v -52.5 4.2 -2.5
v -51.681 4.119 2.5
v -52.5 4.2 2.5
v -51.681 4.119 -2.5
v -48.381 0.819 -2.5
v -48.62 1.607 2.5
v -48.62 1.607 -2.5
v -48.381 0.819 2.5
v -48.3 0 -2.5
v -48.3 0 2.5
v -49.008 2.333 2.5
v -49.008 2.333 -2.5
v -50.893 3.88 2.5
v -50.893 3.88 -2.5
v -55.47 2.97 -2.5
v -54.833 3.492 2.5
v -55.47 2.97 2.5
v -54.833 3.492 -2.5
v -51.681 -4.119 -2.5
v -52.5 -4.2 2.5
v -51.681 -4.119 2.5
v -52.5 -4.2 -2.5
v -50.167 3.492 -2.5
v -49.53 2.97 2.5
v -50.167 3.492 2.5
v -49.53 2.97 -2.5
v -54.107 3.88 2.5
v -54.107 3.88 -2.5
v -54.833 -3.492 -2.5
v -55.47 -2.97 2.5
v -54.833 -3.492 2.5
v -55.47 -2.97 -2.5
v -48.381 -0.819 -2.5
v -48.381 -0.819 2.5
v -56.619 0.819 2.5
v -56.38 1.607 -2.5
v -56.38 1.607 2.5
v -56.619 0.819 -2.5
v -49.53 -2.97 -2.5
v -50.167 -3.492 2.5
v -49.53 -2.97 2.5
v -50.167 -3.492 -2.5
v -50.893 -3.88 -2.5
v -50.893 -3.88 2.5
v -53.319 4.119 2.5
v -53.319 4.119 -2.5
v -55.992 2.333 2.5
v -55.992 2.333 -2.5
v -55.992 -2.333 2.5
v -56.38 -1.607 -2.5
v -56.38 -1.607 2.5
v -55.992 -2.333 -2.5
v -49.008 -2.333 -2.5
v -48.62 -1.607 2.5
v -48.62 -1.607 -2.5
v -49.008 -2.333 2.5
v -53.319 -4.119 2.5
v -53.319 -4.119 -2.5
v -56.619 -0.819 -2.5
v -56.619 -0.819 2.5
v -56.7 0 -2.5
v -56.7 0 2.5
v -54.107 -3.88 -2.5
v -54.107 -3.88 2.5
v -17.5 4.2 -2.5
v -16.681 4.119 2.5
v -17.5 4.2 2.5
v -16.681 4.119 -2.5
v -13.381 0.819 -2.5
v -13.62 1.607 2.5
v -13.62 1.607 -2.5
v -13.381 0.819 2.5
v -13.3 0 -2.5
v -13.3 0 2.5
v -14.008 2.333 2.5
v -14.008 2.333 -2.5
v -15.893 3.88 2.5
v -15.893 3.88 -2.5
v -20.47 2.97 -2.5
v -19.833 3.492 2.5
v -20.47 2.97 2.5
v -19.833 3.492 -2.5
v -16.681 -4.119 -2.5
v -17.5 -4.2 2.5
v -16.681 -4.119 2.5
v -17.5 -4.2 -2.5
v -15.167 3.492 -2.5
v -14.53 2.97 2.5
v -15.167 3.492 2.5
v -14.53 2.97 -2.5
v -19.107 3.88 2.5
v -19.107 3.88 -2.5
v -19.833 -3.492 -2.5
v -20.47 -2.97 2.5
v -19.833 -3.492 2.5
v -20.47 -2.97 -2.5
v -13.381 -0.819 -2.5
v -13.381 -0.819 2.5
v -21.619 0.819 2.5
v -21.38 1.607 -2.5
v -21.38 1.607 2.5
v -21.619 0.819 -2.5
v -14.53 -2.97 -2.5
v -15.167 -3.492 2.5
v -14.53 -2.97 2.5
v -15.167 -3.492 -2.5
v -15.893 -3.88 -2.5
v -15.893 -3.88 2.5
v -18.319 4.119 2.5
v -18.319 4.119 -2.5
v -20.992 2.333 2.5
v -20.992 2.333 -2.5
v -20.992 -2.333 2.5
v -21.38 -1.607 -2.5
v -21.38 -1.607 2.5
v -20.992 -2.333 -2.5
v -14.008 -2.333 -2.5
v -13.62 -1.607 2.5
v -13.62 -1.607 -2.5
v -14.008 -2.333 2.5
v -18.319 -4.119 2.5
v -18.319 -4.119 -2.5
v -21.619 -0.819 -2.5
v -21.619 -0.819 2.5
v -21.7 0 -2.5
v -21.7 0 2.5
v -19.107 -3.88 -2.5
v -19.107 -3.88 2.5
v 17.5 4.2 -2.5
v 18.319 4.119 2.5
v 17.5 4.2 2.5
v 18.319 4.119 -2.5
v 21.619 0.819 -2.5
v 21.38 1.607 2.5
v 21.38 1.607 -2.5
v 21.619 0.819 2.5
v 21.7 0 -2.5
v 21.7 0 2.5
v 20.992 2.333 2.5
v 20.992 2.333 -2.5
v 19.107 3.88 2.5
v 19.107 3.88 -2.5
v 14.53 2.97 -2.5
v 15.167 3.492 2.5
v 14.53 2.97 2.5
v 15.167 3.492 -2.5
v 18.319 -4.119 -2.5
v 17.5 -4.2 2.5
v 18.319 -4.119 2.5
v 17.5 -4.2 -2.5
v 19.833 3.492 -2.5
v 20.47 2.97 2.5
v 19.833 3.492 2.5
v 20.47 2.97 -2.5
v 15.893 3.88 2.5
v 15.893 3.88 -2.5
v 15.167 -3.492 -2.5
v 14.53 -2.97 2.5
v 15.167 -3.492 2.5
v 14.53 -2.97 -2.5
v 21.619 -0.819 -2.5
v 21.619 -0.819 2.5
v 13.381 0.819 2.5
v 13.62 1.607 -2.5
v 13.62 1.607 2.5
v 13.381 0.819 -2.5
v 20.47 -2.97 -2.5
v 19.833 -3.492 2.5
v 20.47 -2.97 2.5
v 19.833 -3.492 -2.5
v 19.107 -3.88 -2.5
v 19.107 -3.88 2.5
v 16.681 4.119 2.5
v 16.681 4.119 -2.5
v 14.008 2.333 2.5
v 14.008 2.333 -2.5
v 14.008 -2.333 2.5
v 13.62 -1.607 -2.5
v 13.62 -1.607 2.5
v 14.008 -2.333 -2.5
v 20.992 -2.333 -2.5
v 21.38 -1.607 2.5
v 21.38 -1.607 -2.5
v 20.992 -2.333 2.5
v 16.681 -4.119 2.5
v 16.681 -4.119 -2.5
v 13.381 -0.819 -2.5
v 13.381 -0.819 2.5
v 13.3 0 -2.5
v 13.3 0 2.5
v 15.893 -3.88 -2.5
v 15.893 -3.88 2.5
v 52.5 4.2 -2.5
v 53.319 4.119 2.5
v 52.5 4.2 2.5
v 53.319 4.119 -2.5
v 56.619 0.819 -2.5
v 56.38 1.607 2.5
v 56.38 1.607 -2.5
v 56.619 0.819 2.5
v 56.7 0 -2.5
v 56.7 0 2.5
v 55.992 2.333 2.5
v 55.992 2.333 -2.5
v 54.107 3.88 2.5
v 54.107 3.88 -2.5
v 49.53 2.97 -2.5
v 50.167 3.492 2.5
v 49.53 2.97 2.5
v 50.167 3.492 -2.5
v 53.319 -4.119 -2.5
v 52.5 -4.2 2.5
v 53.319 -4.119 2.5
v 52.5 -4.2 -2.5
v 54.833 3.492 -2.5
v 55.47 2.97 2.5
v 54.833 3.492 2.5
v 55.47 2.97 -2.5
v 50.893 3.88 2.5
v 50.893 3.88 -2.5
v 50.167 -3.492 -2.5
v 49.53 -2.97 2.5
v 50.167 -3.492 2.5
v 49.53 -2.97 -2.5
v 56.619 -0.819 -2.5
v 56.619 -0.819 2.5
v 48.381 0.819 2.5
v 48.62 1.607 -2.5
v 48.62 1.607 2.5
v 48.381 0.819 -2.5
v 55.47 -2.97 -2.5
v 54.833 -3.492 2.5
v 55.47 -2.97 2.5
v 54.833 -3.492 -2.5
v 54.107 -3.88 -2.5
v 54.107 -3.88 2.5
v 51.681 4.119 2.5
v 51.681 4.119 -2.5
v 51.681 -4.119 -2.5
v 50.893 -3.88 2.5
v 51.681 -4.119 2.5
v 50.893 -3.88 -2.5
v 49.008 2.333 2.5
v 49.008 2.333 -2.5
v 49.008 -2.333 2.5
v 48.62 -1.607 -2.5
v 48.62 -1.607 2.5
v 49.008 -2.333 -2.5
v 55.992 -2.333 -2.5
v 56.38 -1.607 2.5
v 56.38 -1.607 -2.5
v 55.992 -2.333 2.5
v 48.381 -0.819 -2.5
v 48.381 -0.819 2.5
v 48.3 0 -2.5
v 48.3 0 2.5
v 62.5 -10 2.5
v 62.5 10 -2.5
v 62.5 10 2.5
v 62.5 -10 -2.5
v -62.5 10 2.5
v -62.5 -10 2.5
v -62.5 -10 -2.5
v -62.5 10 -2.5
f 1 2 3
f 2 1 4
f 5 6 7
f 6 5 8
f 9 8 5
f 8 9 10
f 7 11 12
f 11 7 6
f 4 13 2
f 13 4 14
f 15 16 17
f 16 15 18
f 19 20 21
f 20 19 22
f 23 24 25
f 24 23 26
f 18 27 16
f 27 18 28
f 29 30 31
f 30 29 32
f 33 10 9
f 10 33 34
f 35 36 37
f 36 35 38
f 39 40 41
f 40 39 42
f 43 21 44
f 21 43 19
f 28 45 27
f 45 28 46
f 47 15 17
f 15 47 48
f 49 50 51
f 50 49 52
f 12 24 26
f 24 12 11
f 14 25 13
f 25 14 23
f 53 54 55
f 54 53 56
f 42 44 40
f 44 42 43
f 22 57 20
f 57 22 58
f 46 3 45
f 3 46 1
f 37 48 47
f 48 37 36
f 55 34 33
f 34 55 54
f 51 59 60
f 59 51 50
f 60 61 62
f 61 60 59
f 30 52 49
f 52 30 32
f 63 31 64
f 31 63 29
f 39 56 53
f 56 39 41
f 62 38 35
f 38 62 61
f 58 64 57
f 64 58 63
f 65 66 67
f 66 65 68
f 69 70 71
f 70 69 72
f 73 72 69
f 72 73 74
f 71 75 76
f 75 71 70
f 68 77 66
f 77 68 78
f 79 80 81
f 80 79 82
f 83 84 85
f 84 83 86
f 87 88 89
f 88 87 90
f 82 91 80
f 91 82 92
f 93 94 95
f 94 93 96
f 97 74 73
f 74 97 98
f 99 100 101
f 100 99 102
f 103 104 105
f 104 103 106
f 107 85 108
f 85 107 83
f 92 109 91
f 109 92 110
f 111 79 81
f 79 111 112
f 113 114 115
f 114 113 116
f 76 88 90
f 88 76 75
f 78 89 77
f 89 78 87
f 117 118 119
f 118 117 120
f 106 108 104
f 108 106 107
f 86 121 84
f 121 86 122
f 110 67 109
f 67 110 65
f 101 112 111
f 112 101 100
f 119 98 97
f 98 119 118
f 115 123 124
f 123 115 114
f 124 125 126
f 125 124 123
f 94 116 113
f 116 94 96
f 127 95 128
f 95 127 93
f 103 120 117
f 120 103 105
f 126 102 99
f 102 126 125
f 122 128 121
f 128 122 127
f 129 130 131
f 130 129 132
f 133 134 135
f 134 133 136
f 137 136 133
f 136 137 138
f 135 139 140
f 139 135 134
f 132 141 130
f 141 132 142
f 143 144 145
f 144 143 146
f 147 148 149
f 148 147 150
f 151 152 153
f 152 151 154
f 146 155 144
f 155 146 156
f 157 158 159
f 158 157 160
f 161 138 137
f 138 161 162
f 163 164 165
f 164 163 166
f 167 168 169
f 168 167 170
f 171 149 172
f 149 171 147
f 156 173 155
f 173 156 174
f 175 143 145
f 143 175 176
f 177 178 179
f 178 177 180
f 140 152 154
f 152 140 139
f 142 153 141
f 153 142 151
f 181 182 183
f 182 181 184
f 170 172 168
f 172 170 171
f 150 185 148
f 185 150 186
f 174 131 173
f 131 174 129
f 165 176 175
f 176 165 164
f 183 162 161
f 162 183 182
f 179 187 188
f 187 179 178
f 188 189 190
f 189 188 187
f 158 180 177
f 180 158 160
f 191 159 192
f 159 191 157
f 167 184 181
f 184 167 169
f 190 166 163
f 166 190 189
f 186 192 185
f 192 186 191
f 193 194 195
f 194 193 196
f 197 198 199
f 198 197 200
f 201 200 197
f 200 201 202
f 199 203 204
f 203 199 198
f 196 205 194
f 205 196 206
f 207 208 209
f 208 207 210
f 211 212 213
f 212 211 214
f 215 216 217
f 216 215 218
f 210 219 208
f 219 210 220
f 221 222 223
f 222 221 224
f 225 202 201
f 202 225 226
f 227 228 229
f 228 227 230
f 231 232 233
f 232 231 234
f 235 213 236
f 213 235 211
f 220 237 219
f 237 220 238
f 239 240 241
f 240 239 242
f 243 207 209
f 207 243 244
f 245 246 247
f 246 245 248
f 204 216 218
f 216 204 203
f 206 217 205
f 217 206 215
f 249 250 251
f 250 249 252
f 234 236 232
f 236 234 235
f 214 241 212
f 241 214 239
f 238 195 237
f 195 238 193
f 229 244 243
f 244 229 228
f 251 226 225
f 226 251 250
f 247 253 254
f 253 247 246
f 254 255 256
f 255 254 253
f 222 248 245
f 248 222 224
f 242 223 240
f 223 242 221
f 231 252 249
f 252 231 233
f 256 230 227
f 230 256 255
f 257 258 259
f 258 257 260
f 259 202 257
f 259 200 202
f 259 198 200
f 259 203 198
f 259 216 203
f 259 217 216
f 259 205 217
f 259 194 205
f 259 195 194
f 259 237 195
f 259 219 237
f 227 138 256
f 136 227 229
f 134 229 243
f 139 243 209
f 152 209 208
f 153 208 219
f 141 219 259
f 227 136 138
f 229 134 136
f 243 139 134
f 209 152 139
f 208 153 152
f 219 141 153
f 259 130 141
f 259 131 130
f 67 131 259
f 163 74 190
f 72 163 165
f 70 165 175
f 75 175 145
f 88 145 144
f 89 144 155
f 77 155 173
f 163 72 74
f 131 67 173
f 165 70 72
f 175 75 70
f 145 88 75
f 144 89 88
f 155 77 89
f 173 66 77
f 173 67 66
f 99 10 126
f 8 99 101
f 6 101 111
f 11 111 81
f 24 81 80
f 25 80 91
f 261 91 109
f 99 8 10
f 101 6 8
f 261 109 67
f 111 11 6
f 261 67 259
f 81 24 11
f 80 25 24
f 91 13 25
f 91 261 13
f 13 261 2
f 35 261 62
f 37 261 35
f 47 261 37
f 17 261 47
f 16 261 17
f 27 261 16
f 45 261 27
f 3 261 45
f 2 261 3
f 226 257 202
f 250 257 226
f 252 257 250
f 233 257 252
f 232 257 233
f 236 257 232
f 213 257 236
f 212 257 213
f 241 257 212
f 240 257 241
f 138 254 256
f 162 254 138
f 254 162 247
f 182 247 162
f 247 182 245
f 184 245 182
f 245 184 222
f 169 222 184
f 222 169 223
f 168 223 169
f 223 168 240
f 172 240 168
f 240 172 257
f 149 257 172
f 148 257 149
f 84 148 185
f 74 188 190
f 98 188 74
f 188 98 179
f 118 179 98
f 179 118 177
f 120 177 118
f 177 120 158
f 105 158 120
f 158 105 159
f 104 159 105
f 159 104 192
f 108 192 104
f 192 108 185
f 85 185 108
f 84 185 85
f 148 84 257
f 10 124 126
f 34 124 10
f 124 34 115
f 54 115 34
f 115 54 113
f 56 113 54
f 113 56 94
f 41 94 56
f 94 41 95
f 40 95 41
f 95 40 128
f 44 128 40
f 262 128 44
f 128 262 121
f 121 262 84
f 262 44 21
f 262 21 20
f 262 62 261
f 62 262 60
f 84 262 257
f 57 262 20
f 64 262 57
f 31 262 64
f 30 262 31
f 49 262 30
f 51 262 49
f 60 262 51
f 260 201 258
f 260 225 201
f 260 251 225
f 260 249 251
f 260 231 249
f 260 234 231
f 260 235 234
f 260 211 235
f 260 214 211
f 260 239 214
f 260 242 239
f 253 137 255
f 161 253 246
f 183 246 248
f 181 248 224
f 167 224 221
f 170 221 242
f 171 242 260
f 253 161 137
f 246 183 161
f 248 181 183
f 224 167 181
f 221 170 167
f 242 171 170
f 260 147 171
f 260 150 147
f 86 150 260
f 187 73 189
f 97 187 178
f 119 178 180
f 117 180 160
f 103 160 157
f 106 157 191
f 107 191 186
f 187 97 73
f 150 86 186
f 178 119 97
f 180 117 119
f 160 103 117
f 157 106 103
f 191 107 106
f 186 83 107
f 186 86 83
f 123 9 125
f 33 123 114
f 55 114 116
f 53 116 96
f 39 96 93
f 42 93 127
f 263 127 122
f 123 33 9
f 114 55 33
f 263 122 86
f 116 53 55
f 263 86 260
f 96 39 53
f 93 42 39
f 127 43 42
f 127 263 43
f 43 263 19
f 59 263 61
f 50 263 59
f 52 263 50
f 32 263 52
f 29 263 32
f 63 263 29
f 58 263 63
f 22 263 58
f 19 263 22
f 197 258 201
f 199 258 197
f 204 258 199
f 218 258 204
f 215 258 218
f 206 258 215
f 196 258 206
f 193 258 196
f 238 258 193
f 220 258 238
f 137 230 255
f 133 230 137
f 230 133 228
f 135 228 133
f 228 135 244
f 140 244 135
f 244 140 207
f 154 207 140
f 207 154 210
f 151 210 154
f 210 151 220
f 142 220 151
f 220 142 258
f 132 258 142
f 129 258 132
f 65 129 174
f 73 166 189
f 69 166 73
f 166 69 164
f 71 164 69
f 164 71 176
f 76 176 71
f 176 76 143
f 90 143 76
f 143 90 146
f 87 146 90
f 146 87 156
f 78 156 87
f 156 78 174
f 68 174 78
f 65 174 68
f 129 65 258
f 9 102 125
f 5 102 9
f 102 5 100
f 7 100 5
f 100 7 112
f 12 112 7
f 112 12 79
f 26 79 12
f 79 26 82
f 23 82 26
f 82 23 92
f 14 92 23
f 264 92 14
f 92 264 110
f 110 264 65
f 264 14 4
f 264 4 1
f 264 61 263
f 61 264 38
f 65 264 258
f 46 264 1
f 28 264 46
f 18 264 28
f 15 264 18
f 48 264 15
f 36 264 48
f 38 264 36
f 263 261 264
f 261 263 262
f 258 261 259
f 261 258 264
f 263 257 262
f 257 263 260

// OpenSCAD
$fn = 32;

// ----------------------------------------------------------------------
// Hole bar, 4 x Ø8.4
// skip layout, 10 mm edge offset
// ----------------------------------------------------------------------

// --- parameters (mm) ---
bar_w = 20;         // bar width (Y)
seat_tol = 0.1;     // tolerance at the seating features
free_tol = 0.5;     // general tolerance on the free sizes
bar_t = 5;          // bar thickness (Z)
holes = 4;          // holes per row
hole_d = 8.4;       // hole diameter
edge = 10;          // offset from the bar end to the first hole
grid_pitch = 17.5;  // grid the bar was laid out on

// --- derived feature positions (mm) ---
pitch = grid_pitch * 2;       // = 35   holes sit every other grid slot
span = (holes - 1) * pitch;   // = 105   distance between the end holes
bar_l = span + 2 * edge;      // = 125   overall bar length
start_x = -bar_l / 2 + edge;  // = -52.5   X of the first hole
feature_centers = [
  [start_x + 0 * pitch, 0],
  [start_x + 1 * pitch, 0],
  [start_x + 2 * pitch, 0],
  [start_x + 3 * pitch, 0]
];   // hole centres of the first row

// bar with one row of holes, drilled from feature_centers
difference() {
  translate([-bar_l / 2, -bar_w / 2, -bar_t / 2]) cube([bar_l, bar_w, bar_t]);
  for (centre = feature_centers)
    translate([centre[0], centre[1], 0])
      cylinder(d = hole_d, h = bar_t + 2, center = true);
}
